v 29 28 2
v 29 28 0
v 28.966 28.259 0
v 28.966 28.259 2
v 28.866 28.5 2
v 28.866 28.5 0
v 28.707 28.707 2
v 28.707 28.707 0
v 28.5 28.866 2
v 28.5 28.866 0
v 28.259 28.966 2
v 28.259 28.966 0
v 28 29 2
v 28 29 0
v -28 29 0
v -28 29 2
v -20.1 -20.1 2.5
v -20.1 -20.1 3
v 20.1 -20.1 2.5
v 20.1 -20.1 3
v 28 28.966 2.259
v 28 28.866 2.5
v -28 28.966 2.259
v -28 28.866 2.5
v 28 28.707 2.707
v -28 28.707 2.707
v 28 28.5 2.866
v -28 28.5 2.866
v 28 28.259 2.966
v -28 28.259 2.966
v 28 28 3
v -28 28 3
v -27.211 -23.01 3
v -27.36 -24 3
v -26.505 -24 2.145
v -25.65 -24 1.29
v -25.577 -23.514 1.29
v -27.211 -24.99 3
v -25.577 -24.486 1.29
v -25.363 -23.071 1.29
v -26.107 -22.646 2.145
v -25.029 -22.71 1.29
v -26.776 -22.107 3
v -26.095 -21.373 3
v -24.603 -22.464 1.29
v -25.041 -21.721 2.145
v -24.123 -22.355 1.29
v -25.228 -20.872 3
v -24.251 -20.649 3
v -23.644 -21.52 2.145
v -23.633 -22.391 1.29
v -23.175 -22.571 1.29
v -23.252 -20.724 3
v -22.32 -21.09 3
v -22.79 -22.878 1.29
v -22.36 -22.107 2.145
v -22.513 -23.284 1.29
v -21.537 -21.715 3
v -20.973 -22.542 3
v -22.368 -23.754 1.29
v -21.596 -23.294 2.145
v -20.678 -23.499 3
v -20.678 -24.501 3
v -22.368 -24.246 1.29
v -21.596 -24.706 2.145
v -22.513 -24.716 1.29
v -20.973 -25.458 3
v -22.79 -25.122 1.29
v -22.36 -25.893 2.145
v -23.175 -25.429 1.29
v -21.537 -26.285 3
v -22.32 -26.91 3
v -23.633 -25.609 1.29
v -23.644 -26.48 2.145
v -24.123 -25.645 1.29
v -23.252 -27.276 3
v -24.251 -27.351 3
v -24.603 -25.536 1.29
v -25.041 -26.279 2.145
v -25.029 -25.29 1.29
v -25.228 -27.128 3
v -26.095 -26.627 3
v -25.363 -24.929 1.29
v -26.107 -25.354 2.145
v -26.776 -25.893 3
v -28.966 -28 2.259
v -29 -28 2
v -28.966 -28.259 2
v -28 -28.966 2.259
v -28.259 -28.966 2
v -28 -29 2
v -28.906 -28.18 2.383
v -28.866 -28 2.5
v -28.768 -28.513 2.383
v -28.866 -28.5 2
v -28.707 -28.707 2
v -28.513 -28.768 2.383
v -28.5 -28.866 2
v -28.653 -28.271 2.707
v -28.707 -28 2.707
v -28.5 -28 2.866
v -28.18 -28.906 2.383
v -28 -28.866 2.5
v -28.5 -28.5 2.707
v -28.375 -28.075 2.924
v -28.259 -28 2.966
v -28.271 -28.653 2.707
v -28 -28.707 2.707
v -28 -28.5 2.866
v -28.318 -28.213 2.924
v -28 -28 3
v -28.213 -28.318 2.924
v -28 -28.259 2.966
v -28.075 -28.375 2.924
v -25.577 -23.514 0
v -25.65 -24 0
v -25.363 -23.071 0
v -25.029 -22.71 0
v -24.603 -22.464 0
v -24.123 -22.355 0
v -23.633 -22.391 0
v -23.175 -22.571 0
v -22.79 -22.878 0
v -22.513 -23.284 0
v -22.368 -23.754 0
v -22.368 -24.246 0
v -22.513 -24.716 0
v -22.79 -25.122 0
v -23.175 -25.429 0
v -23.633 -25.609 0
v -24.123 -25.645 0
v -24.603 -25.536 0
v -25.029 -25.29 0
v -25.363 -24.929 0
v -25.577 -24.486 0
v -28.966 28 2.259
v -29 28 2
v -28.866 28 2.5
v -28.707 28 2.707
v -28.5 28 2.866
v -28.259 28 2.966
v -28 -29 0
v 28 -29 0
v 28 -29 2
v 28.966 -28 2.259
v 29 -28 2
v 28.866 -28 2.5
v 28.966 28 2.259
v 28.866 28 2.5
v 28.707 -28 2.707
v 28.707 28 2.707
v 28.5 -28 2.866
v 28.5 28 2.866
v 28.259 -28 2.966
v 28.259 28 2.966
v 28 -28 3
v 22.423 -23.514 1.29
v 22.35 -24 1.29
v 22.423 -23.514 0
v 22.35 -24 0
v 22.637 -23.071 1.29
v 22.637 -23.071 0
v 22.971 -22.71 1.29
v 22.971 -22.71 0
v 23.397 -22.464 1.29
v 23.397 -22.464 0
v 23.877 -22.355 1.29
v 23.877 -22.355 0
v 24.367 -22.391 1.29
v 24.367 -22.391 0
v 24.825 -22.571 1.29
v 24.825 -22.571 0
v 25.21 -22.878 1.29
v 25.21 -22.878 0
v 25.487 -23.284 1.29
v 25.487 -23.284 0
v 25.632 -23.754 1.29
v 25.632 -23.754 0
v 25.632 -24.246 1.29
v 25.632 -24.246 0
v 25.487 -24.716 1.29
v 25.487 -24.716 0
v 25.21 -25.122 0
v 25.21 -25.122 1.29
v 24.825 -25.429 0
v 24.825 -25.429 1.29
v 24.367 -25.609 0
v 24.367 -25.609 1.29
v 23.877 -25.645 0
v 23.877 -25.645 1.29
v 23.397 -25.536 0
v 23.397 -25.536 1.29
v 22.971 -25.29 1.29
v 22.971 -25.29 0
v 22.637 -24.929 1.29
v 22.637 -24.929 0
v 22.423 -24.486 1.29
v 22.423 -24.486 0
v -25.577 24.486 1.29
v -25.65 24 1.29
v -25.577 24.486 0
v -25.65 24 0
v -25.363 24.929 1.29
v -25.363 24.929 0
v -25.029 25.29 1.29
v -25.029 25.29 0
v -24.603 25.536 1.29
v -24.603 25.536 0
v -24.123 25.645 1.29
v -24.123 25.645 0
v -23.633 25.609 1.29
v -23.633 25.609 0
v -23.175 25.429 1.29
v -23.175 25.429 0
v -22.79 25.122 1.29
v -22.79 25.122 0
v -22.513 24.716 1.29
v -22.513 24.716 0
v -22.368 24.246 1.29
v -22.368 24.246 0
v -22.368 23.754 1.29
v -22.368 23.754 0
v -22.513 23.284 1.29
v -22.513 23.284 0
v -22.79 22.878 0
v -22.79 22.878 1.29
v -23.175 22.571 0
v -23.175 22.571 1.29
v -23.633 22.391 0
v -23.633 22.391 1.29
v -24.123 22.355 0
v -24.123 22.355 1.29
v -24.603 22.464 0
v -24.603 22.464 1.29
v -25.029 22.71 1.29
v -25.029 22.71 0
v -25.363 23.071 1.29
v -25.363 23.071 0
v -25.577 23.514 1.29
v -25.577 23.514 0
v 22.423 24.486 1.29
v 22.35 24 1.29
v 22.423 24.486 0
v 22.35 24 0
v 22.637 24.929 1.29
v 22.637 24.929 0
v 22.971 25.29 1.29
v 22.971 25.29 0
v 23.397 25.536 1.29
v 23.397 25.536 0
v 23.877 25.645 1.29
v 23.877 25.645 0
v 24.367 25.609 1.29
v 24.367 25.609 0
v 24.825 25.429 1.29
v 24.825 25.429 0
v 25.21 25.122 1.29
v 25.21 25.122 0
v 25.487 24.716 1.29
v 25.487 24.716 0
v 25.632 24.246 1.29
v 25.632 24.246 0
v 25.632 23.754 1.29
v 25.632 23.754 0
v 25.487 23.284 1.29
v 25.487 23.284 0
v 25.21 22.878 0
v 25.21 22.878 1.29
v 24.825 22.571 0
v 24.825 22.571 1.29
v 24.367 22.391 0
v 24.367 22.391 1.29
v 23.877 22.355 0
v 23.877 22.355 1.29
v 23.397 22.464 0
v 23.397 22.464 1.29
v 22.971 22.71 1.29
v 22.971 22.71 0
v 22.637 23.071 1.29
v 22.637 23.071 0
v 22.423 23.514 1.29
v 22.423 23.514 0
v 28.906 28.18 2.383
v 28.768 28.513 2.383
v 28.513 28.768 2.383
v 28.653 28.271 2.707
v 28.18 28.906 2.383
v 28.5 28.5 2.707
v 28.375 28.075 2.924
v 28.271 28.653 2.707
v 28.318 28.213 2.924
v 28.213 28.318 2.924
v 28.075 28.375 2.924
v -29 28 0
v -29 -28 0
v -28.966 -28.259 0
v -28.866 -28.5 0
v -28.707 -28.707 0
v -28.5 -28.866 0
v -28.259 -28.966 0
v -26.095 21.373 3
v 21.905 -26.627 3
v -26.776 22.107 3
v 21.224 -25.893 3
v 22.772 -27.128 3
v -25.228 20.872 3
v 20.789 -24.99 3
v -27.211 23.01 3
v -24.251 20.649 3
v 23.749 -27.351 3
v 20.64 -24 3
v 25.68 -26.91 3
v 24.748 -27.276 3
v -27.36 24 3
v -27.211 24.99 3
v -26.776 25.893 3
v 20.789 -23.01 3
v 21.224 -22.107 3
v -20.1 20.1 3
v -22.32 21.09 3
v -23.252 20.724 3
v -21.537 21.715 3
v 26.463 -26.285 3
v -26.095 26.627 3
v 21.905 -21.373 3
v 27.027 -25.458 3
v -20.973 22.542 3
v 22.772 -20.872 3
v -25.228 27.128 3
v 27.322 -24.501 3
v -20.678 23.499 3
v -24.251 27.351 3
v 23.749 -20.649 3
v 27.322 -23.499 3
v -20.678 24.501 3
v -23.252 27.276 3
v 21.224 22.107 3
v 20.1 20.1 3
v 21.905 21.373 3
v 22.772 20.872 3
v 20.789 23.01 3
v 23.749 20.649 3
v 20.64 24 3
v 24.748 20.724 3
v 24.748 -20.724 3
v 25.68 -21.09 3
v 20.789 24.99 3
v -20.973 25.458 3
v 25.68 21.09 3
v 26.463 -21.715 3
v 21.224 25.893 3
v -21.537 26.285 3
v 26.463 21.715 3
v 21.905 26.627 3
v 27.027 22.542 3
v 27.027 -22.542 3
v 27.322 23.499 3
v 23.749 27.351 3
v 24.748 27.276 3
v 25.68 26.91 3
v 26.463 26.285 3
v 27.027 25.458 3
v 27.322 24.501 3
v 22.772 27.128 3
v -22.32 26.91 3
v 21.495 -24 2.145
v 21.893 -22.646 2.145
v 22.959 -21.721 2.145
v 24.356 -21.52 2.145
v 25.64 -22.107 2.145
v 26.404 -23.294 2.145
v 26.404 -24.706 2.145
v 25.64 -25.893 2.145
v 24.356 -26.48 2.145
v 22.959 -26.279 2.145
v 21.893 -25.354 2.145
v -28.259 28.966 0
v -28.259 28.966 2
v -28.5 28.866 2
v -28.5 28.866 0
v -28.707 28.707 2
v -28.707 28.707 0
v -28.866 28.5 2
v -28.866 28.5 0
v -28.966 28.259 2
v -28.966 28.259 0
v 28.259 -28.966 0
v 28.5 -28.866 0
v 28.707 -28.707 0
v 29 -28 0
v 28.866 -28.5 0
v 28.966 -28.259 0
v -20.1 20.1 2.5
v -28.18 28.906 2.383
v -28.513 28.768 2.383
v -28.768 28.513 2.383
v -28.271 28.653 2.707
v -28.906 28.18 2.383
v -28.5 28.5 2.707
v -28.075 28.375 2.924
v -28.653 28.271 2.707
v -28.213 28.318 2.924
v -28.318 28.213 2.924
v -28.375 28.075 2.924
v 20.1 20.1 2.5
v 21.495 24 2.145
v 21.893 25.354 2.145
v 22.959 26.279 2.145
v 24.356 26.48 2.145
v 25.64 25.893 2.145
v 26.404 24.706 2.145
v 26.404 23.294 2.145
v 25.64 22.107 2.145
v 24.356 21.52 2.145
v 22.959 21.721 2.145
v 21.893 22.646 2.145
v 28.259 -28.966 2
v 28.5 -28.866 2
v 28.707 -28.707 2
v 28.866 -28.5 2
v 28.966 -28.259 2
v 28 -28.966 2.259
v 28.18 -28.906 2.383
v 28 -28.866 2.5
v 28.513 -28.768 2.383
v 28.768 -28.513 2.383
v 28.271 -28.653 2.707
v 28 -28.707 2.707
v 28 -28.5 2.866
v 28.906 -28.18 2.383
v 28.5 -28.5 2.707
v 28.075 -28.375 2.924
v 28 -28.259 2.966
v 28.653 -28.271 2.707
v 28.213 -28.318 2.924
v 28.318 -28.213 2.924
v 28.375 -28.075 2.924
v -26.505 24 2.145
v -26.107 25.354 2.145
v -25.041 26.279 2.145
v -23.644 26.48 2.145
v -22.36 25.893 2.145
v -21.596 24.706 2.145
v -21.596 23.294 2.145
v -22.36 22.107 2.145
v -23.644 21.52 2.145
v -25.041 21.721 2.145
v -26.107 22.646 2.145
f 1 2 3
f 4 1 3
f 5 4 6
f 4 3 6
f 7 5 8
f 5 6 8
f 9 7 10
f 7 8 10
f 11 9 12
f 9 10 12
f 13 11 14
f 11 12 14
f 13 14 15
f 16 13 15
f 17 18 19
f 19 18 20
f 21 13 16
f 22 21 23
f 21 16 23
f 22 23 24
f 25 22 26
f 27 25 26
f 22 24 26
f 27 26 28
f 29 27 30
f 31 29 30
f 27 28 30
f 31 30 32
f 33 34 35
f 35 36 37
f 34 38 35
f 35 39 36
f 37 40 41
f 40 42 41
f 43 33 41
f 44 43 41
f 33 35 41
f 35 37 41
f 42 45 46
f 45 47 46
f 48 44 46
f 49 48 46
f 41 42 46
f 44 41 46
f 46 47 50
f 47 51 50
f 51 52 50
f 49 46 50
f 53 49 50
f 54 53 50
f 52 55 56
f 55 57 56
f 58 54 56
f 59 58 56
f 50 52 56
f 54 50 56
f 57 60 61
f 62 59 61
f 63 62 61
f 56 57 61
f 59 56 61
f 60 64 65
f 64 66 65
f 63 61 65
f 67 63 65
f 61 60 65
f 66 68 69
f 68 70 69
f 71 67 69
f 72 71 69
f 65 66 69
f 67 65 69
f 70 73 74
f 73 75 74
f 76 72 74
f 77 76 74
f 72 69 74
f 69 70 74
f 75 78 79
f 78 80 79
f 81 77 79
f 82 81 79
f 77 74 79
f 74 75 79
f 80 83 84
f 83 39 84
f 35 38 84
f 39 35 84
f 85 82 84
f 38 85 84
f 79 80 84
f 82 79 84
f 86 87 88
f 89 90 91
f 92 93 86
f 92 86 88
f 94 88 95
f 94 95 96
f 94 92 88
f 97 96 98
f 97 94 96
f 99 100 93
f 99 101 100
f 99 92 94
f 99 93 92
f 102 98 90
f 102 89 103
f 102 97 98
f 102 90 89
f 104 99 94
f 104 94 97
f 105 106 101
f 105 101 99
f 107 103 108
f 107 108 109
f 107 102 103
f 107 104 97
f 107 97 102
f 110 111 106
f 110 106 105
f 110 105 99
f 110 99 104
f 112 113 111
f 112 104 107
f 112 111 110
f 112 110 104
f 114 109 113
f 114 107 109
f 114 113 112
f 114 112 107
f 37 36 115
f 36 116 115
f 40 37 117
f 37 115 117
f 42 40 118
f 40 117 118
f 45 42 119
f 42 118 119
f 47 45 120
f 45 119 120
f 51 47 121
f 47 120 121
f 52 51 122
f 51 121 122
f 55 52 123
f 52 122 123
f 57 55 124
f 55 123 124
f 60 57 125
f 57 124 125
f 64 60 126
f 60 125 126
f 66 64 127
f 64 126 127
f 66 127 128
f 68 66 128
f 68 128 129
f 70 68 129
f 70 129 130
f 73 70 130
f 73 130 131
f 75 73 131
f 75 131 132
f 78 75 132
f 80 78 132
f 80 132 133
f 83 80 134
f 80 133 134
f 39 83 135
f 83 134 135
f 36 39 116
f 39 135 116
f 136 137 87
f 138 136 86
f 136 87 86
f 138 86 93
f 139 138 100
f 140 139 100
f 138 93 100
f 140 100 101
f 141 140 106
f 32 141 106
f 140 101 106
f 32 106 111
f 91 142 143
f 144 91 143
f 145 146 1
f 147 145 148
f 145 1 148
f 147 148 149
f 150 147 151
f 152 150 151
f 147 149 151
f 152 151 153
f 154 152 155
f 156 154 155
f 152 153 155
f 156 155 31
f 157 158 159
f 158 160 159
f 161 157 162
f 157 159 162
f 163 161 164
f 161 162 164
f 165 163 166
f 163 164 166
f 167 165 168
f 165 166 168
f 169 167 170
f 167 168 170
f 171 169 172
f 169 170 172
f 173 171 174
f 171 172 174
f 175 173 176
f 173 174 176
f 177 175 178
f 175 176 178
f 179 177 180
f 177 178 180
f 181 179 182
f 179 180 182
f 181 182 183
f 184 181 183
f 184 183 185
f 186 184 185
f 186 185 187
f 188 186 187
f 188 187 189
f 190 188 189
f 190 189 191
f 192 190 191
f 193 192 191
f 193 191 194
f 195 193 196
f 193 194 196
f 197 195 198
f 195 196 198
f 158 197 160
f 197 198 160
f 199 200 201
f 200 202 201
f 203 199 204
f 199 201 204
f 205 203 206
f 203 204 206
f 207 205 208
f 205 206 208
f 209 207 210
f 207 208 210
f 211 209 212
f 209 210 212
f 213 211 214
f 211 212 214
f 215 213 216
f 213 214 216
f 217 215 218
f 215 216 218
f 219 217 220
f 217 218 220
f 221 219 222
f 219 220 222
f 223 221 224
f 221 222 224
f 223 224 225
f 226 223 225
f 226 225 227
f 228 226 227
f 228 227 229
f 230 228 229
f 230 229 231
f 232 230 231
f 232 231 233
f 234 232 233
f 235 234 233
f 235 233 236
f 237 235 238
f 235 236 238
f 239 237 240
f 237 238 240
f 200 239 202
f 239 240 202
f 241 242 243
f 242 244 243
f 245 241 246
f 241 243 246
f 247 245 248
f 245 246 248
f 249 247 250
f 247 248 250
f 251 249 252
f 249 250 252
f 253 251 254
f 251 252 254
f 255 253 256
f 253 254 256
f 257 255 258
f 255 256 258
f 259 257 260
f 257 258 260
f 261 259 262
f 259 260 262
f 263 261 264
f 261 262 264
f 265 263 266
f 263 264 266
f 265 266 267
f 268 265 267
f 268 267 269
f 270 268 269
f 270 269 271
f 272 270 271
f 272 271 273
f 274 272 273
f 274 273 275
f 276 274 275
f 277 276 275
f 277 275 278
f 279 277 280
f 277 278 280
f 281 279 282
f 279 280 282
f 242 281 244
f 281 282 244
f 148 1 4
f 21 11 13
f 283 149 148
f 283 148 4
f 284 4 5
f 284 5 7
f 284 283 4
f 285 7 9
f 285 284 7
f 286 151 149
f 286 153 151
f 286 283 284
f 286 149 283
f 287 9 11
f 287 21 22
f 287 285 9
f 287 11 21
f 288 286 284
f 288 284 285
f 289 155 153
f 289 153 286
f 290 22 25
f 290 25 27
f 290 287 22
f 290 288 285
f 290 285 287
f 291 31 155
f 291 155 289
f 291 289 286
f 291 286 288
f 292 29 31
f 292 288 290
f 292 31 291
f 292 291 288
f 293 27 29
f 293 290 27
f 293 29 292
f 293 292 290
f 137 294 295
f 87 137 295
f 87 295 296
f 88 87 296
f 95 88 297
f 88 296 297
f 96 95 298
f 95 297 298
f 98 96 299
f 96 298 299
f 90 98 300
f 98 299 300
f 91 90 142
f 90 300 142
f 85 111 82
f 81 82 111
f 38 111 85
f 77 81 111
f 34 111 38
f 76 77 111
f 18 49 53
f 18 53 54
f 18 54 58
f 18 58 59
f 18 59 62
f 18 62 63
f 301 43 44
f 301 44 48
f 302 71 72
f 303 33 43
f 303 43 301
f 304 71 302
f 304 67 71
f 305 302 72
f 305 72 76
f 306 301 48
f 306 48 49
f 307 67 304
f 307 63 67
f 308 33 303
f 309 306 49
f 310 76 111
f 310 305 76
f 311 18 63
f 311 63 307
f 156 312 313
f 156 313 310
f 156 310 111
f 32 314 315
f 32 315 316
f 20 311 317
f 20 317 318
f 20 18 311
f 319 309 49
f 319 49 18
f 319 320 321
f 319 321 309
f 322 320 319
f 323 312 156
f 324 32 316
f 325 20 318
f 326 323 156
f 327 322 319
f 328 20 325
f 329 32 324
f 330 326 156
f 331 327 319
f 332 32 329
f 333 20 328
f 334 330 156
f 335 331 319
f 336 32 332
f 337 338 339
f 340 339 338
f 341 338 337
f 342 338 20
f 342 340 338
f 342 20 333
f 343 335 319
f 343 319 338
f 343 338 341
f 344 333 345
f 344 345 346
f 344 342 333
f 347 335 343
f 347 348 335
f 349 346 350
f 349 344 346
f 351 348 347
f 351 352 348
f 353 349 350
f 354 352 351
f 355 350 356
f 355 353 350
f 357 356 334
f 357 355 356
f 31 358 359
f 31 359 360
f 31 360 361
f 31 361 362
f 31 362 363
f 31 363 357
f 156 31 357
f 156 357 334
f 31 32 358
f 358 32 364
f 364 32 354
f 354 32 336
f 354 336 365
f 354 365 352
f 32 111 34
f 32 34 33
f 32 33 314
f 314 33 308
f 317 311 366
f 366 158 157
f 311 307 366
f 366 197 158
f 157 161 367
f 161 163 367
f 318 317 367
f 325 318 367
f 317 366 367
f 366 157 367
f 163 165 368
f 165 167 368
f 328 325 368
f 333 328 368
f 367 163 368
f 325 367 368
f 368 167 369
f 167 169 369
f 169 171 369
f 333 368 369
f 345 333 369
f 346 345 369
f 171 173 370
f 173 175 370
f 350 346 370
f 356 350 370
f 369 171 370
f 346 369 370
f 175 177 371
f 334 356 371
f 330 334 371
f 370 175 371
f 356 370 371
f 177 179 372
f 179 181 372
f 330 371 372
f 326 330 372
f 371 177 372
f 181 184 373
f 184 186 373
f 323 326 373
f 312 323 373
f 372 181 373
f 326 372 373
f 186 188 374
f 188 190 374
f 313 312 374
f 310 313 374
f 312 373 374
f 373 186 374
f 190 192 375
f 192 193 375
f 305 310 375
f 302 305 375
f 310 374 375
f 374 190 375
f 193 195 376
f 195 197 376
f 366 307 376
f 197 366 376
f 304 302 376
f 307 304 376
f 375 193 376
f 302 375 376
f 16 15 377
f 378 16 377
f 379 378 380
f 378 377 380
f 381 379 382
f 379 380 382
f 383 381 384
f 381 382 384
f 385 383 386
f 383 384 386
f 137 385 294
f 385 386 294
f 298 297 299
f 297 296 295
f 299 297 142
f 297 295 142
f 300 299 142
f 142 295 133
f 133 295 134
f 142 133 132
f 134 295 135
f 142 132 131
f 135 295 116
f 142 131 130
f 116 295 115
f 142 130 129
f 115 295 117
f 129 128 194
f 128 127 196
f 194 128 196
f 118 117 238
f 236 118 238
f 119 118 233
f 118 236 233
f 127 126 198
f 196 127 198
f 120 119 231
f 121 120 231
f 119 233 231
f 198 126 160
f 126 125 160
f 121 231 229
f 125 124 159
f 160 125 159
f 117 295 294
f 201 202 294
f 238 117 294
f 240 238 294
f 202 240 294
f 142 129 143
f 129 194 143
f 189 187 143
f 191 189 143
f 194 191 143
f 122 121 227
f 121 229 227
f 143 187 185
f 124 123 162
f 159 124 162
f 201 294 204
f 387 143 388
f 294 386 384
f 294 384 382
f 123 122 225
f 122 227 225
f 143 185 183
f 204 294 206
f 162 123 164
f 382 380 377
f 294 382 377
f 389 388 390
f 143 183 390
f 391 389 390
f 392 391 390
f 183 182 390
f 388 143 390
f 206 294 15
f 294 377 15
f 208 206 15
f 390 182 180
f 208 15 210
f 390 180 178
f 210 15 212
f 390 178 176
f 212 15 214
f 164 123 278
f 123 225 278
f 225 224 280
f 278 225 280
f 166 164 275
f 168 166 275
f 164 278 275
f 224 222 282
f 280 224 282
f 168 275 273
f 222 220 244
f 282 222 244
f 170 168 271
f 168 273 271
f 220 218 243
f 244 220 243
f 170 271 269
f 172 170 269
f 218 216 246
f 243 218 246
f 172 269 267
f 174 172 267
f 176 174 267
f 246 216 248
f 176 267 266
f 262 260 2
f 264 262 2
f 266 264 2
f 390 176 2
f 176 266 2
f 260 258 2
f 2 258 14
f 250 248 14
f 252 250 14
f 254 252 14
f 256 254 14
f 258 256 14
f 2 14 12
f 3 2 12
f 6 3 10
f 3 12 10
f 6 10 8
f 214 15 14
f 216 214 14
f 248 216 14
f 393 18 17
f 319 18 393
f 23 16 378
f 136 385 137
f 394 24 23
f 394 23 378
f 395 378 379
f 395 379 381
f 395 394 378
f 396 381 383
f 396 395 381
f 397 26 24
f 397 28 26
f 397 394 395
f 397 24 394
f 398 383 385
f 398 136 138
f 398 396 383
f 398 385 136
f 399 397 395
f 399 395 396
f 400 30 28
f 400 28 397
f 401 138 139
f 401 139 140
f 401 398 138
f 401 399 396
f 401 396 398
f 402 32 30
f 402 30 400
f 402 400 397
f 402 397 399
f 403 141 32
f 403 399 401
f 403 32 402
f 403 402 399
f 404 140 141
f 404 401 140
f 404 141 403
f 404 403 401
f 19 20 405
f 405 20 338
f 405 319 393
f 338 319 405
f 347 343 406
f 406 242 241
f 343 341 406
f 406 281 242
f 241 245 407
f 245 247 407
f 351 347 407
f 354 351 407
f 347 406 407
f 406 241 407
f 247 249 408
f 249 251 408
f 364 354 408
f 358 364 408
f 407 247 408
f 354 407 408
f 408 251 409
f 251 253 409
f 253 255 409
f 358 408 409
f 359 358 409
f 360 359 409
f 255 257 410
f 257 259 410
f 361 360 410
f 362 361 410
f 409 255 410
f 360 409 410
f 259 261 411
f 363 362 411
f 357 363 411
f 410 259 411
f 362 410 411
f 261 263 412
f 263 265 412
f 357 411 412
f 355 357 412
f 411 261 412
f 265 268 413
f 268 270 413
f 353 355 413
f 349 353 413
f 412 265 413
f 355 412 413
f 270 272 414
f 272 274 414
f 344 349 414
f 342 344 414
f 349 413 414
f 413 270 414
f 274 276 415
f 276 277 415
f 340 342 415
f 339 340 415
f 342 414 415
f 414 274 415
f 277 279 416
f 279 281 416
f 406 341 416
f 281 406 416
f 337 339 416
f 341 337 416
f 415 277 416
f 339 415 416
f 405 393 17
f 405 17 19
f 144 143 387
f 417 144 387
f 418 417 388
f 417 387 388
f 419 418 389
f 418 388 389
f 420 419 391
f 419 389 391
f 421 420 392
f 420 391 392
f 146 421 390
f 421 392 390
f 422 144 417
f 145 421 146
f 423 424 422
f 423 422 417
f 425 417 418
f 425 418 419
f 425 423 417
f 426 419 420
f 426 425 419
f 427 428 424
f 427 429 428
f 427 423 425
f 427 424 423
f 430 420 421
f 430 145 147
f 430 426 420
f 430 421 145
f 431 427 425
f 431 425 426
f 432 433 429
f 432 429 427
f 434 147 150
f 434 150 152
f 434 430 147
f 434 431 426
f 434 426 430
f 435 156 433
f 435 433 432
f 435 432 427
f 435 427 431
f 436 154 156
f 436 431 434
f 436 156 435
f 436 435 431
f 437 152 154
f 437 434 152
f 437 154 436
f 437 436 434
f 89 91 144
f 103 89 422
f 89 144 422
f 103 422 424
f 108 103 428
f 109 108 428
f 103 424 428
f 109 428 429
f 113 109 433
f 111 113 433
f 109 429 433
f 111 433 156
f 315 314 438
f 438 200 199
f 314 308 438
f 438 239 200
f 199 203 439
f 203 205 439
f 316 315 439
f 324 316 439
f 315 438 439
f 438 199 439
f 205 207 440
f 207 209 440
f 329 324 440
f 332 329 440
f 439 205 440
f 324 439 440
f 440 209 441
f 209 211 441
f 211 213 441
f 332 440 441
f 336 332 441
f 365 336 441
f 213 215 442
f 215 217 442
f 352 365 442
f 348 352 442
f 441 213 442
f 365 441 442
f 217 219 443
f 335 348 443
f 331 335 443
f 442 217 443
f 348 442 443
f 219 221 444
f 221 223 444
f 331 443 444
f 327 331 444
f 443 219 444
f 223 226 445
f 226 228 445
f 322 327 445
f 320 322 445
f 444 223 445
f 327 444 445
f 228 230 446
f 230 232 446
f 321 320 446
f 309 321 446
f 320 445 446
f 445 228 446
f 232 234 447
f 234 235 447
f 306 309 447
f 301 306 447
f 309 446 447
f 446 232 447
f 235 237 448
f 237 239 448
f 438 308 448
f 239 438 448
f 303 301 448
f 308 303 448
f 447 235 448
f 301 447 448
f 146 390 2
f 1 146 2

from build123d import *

# Parameters (mm, degrees)
F1_DEPTH       = 3
F2_R           = 1
F4_D           = 3.3
F4_CSINK_D     = 6.72
F4_CSINK_ANGLE = 90
F5_W           = 40.2
F5_H           = 40.2
F6_DEPTH       = 0.5


with BuildPart() as f1:
    # F0 (on Top) → F1 (new body)
    with BuildSketch(Plane.XY):
        with BuildLine():
            Line((-28, -29), (28, -29))
            ThreePointArc((28, -29), (28.7071067812, -28.7071067812), (29, -28))
            Line((29, -28), (29, 28))
            ThreePointArc((29, 28), (28.7071067812, 28.7071067812), (28, 29))
            Line((28, 29), (-28, 29))
            ThreePointArc((-28, 29), (-28.7071067812, 28.7071067812), (-29, 28))
            Line((-29, 28), (-29, -28))
            ThreePointArc((-29, -28), (-28.7071067812, -28.7071067812), (-28, -29))
        make_face()
    extrude(amount=F1_DEPTH)

    # F2
    f2_edges = [f1.edges().sort_by_distance(p)[0] for p in [
        (29, 0, 3),
    ]]
    fillet(f2_edges, radius=F2_R)

    # F4 (through all)
    with Locations(Plane.XY.offset(3)):
        with Locations((-24, 24), (24, 24), (-24, -24), (24, -24)):
            CounterSinkHole(F4_D / 2, F4_CSINK_D / 2, counter_sink_angle=F4_CSINK_ANGLE)

    # F5 (on face) → F6 (cut)
    with BuildSketch(Plane.XY.offset(3)):
        Rectangle(F5_W, F5_H)
    extrude(amount=-F6_DEPTH, mode=Mode.SUBTRACT)


solid = f1.part
